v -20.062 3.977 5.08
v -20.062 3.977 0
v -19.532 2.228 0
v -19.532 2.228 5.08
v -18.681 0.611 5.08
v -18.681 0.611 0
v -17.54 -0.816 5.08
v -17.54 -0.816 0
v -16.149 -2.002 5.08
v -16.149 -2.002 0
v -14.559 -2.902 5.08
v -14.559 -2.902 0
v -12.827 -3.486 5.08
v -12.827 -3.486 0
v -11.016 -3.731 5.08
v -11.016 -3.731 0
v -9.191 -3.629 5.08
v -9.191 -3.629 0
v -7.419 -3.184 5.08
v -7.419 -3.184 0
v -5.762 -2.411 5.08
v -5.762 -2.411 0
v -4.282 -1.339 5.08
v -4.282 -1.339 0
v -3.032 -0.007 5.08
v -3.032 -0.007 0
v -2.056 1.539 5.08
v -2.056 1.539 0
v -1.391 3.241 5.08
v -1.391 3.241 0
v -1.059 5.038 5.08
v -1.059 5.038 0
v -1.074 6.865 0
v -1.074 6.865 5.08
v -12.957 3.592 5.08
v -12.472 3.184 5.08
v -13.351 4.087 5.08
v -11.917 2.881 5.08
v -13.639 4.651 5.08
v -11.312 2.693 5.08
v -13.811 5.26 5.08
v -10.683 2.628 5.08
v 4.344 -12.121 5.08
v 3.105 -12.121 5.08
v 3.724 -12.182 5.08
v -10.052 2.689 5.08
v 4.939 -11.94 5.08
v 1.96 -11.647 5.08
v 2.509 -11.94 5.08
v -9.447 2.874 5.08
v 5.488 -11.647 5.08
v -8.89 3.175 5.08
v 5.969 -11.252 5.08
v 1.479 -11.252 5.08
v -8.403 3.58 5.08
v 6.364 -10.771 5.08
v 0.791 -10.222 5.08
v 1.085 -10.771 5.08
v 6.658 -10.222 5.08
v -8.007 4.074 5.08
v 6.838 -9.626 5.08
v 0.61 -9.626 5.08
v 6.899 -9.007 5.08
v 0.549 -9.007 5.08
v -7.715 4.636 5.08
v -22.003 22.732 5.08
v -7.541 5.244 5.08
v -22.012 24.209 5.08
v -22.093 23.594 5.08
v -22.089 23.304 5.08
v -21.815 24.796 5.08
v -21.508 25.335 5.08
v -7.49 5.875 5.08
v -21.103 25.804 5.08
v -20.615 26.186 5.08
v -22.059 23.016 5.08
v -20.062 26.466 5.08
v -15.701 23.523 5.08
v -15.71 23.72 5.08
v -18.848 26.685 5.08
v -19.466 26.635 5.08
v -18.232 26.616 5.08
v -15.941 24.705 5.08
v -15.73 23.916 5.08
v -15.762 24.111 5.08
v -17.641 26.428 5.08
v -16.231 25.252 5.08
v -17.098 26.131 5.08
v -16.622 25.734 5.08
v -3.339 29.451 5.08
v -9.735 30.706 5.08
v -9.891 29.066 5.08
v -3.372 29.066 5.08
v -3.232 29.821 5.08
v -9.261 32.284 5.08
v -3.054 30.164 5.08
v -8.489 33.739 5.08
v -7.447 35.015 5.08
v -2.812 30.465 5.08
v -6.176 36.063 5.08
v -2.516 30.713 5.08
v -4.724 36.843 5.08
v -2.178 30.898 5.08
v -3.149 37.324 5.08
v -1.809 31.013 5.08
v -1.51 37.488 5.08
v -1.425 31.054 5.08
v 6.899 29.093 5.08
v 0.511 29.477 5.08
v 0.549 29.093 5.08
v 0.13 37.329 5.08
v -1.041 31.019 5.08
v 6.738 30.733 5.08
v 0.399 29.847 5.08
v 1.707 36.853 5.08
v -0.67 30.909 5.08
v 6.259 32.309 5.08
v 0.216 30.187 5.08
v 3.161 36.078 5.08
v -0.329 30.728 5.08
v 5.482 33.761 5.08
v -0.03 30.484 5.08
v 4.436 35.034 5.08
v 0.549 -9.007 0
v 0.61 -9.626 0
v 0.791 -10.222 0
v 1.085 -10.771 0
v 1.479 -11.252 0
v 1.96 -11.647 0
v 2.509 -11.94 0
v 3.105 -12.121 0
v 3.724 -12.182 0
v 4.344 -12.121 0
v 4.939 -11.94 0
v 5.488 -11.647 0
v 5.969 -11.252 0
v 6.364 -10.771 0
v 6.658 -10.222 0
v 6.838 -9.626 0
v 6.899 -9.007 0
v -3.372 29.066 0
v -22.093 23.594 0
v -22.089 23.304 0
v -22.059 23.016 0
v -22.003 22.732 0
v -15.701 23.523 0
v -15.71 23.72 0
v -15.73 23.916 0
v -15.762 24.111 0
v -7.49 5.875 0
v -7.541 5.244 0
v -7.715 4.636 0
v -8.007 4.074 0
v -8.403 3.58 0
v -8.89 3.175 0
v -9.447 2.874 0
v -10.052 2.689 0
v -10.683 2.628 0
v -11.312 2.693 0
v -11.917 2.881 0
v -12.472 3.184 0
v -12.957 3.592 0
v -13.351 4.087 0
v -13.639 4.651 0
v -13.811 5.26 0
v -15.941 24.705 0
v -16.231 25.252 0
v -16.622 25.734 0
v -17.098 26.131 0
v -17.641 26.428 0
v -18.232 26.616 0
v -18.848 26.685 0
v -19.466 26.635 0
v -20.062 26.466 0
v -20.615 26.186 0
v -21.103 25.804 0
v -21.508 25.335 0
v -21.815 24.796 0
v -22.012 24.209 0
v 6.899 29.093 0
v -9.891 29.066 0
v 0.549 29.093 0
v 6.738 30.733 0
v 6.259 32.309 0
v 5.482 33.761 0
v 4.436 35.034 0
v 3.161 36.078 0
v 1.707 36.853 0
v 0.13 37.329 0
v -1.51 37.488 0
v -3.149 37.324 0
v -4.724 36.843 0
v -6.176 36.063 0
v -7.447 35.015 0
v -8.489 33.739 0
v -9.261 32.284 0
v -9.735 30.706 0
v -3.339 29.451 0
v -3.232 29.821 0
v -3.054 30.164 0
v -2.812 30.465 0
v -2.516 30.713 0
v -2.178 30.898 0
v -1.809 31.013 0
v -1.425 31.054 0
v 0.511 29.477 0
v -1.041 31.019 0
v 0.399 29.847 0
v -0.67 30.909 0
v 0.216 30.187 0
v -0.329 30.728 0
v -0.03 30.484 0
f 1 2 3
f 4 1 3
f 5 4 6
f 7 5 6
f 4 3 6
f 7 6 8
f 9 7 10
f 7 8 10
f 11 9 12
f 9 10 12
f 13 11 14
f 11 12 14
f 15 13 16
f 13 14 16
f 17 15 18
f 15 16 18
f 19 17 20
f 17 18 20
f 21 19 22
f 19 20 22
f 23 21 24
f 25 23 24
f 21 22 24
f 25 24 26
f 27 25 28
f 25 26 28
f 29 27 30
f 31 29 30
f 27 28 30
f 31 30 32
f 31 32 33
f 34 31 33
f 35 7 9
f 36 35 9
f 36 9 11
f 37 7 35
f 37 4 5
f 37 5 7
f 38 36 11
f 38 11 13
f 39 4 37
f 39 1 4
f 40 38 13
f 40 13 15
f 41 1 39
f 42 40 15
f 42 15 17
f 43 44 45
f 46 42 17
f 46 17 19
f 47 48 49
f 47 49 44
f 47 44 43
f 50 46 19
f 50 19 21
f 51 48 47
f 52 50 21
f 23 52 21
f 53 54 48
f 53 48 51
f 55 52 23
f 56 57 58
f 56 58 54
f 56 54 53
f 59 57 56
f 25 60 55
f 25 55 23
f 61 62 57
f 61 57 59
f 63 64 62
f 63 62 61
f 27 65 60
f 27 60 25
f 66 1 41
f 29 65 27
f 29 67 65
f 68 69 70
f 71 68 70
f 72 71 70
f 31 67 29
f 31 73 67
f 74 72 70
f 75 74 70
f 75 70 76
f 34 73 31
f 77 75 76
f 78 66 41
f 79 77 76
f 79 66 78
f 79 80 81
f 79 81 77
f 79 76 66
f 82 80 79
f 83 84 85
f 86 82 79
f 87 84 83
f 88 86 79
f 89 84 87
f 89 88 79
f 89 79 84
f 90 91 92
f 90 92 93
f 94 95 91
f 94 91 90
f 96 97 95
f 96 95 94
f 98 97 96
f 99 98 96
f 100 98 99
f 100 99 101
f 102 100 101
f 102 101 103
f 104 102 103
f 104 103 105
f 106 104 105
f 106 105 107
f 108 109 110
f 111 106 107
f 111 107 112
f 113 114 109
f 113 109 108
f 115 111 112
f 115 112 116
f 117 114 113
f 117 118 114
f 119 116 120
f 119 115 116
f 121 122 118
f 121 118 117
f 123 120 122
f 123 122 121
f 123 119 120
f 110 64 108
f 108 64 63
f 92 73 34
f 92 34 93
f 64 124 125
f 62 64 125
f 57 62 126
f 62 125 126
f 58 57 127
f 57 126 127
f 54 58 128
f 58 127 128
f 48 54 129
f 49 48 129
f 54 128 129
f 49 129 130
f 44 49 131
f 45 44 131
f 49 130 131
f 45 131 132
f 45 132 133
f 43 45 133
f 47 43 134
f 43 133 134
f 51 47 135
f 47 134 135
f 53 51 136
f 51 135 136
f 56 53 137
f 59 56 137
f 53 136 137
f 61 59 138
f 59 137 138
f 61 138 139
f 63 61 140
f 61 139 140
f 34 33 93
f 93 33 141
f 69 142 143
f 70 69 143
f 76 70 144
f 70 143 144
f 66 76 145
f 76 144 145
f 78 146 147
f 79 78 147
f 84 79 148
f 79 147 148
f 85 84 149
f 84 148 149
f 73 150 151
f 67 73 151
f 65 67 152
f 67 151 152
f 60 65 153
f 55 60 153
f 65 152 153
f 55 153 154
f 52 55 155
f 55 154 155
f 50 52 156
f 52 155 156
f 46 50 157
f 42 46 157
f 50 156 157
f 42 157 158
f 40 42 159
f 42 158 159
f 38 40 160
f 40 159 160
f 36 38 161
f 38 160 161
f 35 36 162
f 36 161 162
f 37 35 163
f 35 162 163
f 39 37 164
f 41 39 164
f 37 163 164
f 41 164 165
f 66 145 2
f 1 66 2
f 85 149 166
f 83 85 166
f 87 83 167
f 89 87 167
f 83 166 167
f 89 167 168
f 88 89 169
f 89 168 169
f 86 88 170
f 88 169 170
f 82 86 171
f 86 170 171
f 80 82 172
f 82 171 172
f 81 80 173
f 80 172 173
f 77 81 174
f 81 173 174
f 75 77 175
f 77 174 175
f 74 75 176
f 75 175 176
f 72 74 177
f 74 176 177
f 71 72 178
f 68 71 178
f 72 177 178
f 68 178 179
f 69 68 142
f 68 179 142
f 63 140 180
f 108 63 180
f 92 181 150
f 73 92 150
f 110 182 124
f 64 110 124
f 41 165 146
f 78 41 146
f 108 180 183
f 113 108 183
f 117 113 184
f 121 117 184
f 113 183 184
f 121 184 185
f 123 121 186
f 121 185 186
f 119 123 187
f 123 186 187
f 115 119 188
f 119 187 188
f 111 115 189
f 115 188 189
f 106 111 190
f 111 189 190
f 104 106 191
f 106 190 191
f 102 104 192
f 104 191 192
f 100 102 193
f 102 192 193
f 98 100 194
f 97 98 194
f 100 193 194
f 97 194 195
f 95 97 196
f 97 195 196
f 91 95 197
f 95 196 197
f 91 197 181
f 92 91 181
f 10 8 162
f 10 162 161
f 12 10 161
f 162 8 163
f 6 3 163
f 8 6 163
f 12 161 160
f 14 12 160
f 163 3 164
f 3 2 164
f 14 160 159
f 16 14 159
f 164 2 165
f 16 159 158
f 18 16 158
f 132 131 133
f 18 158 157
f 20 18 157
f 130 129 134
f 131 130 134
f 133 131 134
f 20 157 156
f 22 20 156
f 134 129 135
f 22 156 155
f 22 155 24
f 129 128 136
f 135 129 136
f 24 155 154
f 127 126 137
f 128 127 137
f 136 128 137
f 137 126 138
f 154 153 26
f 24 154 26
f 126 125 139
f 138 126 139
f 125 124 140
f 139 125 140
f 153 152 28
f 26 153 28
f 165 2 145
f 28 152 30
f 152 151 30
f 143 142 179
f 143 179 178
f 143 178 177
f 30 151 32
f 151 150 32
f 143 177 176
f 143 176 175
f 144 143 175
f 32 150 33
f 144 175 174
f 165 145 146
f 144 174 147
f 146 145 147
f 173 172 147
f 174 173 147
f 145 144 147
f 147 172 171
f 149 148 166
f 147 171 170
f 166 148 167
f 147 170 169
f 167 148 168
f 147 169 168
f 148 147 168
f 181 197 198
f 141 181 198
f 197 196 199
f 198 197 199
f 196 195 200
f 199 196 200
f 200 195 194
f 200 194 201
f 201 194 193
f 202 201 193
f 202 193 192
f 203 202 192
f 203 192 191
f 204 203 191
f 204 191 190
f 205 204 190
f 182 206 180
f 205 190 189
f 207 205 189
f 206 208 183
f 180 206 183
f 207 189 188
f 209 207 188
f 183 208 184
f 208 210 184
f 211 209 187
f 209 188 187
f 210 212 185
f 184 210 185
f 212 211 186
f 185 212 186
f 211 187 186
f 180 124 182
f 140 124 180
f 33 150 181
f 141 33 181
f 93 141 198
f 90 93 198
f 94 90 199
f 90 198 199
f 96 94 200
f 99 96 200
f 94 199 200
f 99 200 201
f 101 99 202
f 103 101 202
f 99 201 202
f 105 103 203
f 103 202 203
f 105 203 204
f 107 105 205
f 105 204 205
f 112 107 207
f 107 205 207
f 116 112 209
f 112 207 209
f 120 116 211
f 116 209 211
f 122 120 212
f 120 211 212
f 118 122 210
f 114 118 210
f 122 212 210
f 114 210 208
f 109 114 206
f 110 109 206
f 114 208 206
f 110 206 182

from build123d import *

# Parameters (mm, degrees)
F1_DEPTH = 5.08


with BuildPart() as f1:
    # F0 (on Top) → F1 (new body)
    with BuildSketch(Plane.XY):
        with BuildLine():
            Line((0.549417, 29.093022), (0.549417, -9.006978))
            ThreePointArc((0.549417, -9.006978), (1.479353, -11.252042), (3.724417, -12.181978))
            ThreePointArc((3.724417, -12.181978), (5.969481, -11.252042), (6.899417, -9.006978))
            Line((6.899417, -9.006978), (6.899417, 29.093022))
            ThreePointArc((6.899417, 29.093022), (-1.509537, 37.488393), (-9.891303, 29.065877))
            Line((-9.891303, 29.065877), (-7.490417, 5.875438))
            ThreePointArc((-7.490417, 5.875438), (-10.365969, 2.64314), (-13.81069, 5.260477))
            Line((-13.81069, 5.260477), (-15.701351, 23.522593))
            Line((-15.701351, 23.522593), (-15.762292, 24.111232))
            ThreePointArc((-15.762292, 24.111232), (-19.158057, 26.675151), (-22.092695, 23.594112))
            Line((-22.092695, 23.594112), (-22.003429, 22.731883))
            Line((-22.003429, 22.731883), (-20.061784, 3.977299))
            ThreePointArc((-20.061784, 3.977299), (-9.191107, -3.629406), (-1.073799, 6.865493))
            Line((-1.073799, 6.865493), (-3.372185, 29.065877))
            ThreePointArc((-3.372185, 29.065877), (-1.425051, 31.05387), (0.549417, 29.093022))
        make_face()
        with BuildLine():
            ThreePointArc((-22.092695, 23.594112), (-22.077424, 23.159958), (-22.003429, 22.731883))
            Line((-22.003429, 22.731883), (-22.092695, 23.594112))
        make_face()
        with BuildLine():
            ThreePointArc((-15.701351, 23.522593), (-15.718171, 23.818326), (-15.762292, 24.111232))
            Line((-15.762292, 24.111232), (-15.701351, 23.522593))
        make_face()
    extrude(amount=F1_DEPTH)


solid = f1.part
